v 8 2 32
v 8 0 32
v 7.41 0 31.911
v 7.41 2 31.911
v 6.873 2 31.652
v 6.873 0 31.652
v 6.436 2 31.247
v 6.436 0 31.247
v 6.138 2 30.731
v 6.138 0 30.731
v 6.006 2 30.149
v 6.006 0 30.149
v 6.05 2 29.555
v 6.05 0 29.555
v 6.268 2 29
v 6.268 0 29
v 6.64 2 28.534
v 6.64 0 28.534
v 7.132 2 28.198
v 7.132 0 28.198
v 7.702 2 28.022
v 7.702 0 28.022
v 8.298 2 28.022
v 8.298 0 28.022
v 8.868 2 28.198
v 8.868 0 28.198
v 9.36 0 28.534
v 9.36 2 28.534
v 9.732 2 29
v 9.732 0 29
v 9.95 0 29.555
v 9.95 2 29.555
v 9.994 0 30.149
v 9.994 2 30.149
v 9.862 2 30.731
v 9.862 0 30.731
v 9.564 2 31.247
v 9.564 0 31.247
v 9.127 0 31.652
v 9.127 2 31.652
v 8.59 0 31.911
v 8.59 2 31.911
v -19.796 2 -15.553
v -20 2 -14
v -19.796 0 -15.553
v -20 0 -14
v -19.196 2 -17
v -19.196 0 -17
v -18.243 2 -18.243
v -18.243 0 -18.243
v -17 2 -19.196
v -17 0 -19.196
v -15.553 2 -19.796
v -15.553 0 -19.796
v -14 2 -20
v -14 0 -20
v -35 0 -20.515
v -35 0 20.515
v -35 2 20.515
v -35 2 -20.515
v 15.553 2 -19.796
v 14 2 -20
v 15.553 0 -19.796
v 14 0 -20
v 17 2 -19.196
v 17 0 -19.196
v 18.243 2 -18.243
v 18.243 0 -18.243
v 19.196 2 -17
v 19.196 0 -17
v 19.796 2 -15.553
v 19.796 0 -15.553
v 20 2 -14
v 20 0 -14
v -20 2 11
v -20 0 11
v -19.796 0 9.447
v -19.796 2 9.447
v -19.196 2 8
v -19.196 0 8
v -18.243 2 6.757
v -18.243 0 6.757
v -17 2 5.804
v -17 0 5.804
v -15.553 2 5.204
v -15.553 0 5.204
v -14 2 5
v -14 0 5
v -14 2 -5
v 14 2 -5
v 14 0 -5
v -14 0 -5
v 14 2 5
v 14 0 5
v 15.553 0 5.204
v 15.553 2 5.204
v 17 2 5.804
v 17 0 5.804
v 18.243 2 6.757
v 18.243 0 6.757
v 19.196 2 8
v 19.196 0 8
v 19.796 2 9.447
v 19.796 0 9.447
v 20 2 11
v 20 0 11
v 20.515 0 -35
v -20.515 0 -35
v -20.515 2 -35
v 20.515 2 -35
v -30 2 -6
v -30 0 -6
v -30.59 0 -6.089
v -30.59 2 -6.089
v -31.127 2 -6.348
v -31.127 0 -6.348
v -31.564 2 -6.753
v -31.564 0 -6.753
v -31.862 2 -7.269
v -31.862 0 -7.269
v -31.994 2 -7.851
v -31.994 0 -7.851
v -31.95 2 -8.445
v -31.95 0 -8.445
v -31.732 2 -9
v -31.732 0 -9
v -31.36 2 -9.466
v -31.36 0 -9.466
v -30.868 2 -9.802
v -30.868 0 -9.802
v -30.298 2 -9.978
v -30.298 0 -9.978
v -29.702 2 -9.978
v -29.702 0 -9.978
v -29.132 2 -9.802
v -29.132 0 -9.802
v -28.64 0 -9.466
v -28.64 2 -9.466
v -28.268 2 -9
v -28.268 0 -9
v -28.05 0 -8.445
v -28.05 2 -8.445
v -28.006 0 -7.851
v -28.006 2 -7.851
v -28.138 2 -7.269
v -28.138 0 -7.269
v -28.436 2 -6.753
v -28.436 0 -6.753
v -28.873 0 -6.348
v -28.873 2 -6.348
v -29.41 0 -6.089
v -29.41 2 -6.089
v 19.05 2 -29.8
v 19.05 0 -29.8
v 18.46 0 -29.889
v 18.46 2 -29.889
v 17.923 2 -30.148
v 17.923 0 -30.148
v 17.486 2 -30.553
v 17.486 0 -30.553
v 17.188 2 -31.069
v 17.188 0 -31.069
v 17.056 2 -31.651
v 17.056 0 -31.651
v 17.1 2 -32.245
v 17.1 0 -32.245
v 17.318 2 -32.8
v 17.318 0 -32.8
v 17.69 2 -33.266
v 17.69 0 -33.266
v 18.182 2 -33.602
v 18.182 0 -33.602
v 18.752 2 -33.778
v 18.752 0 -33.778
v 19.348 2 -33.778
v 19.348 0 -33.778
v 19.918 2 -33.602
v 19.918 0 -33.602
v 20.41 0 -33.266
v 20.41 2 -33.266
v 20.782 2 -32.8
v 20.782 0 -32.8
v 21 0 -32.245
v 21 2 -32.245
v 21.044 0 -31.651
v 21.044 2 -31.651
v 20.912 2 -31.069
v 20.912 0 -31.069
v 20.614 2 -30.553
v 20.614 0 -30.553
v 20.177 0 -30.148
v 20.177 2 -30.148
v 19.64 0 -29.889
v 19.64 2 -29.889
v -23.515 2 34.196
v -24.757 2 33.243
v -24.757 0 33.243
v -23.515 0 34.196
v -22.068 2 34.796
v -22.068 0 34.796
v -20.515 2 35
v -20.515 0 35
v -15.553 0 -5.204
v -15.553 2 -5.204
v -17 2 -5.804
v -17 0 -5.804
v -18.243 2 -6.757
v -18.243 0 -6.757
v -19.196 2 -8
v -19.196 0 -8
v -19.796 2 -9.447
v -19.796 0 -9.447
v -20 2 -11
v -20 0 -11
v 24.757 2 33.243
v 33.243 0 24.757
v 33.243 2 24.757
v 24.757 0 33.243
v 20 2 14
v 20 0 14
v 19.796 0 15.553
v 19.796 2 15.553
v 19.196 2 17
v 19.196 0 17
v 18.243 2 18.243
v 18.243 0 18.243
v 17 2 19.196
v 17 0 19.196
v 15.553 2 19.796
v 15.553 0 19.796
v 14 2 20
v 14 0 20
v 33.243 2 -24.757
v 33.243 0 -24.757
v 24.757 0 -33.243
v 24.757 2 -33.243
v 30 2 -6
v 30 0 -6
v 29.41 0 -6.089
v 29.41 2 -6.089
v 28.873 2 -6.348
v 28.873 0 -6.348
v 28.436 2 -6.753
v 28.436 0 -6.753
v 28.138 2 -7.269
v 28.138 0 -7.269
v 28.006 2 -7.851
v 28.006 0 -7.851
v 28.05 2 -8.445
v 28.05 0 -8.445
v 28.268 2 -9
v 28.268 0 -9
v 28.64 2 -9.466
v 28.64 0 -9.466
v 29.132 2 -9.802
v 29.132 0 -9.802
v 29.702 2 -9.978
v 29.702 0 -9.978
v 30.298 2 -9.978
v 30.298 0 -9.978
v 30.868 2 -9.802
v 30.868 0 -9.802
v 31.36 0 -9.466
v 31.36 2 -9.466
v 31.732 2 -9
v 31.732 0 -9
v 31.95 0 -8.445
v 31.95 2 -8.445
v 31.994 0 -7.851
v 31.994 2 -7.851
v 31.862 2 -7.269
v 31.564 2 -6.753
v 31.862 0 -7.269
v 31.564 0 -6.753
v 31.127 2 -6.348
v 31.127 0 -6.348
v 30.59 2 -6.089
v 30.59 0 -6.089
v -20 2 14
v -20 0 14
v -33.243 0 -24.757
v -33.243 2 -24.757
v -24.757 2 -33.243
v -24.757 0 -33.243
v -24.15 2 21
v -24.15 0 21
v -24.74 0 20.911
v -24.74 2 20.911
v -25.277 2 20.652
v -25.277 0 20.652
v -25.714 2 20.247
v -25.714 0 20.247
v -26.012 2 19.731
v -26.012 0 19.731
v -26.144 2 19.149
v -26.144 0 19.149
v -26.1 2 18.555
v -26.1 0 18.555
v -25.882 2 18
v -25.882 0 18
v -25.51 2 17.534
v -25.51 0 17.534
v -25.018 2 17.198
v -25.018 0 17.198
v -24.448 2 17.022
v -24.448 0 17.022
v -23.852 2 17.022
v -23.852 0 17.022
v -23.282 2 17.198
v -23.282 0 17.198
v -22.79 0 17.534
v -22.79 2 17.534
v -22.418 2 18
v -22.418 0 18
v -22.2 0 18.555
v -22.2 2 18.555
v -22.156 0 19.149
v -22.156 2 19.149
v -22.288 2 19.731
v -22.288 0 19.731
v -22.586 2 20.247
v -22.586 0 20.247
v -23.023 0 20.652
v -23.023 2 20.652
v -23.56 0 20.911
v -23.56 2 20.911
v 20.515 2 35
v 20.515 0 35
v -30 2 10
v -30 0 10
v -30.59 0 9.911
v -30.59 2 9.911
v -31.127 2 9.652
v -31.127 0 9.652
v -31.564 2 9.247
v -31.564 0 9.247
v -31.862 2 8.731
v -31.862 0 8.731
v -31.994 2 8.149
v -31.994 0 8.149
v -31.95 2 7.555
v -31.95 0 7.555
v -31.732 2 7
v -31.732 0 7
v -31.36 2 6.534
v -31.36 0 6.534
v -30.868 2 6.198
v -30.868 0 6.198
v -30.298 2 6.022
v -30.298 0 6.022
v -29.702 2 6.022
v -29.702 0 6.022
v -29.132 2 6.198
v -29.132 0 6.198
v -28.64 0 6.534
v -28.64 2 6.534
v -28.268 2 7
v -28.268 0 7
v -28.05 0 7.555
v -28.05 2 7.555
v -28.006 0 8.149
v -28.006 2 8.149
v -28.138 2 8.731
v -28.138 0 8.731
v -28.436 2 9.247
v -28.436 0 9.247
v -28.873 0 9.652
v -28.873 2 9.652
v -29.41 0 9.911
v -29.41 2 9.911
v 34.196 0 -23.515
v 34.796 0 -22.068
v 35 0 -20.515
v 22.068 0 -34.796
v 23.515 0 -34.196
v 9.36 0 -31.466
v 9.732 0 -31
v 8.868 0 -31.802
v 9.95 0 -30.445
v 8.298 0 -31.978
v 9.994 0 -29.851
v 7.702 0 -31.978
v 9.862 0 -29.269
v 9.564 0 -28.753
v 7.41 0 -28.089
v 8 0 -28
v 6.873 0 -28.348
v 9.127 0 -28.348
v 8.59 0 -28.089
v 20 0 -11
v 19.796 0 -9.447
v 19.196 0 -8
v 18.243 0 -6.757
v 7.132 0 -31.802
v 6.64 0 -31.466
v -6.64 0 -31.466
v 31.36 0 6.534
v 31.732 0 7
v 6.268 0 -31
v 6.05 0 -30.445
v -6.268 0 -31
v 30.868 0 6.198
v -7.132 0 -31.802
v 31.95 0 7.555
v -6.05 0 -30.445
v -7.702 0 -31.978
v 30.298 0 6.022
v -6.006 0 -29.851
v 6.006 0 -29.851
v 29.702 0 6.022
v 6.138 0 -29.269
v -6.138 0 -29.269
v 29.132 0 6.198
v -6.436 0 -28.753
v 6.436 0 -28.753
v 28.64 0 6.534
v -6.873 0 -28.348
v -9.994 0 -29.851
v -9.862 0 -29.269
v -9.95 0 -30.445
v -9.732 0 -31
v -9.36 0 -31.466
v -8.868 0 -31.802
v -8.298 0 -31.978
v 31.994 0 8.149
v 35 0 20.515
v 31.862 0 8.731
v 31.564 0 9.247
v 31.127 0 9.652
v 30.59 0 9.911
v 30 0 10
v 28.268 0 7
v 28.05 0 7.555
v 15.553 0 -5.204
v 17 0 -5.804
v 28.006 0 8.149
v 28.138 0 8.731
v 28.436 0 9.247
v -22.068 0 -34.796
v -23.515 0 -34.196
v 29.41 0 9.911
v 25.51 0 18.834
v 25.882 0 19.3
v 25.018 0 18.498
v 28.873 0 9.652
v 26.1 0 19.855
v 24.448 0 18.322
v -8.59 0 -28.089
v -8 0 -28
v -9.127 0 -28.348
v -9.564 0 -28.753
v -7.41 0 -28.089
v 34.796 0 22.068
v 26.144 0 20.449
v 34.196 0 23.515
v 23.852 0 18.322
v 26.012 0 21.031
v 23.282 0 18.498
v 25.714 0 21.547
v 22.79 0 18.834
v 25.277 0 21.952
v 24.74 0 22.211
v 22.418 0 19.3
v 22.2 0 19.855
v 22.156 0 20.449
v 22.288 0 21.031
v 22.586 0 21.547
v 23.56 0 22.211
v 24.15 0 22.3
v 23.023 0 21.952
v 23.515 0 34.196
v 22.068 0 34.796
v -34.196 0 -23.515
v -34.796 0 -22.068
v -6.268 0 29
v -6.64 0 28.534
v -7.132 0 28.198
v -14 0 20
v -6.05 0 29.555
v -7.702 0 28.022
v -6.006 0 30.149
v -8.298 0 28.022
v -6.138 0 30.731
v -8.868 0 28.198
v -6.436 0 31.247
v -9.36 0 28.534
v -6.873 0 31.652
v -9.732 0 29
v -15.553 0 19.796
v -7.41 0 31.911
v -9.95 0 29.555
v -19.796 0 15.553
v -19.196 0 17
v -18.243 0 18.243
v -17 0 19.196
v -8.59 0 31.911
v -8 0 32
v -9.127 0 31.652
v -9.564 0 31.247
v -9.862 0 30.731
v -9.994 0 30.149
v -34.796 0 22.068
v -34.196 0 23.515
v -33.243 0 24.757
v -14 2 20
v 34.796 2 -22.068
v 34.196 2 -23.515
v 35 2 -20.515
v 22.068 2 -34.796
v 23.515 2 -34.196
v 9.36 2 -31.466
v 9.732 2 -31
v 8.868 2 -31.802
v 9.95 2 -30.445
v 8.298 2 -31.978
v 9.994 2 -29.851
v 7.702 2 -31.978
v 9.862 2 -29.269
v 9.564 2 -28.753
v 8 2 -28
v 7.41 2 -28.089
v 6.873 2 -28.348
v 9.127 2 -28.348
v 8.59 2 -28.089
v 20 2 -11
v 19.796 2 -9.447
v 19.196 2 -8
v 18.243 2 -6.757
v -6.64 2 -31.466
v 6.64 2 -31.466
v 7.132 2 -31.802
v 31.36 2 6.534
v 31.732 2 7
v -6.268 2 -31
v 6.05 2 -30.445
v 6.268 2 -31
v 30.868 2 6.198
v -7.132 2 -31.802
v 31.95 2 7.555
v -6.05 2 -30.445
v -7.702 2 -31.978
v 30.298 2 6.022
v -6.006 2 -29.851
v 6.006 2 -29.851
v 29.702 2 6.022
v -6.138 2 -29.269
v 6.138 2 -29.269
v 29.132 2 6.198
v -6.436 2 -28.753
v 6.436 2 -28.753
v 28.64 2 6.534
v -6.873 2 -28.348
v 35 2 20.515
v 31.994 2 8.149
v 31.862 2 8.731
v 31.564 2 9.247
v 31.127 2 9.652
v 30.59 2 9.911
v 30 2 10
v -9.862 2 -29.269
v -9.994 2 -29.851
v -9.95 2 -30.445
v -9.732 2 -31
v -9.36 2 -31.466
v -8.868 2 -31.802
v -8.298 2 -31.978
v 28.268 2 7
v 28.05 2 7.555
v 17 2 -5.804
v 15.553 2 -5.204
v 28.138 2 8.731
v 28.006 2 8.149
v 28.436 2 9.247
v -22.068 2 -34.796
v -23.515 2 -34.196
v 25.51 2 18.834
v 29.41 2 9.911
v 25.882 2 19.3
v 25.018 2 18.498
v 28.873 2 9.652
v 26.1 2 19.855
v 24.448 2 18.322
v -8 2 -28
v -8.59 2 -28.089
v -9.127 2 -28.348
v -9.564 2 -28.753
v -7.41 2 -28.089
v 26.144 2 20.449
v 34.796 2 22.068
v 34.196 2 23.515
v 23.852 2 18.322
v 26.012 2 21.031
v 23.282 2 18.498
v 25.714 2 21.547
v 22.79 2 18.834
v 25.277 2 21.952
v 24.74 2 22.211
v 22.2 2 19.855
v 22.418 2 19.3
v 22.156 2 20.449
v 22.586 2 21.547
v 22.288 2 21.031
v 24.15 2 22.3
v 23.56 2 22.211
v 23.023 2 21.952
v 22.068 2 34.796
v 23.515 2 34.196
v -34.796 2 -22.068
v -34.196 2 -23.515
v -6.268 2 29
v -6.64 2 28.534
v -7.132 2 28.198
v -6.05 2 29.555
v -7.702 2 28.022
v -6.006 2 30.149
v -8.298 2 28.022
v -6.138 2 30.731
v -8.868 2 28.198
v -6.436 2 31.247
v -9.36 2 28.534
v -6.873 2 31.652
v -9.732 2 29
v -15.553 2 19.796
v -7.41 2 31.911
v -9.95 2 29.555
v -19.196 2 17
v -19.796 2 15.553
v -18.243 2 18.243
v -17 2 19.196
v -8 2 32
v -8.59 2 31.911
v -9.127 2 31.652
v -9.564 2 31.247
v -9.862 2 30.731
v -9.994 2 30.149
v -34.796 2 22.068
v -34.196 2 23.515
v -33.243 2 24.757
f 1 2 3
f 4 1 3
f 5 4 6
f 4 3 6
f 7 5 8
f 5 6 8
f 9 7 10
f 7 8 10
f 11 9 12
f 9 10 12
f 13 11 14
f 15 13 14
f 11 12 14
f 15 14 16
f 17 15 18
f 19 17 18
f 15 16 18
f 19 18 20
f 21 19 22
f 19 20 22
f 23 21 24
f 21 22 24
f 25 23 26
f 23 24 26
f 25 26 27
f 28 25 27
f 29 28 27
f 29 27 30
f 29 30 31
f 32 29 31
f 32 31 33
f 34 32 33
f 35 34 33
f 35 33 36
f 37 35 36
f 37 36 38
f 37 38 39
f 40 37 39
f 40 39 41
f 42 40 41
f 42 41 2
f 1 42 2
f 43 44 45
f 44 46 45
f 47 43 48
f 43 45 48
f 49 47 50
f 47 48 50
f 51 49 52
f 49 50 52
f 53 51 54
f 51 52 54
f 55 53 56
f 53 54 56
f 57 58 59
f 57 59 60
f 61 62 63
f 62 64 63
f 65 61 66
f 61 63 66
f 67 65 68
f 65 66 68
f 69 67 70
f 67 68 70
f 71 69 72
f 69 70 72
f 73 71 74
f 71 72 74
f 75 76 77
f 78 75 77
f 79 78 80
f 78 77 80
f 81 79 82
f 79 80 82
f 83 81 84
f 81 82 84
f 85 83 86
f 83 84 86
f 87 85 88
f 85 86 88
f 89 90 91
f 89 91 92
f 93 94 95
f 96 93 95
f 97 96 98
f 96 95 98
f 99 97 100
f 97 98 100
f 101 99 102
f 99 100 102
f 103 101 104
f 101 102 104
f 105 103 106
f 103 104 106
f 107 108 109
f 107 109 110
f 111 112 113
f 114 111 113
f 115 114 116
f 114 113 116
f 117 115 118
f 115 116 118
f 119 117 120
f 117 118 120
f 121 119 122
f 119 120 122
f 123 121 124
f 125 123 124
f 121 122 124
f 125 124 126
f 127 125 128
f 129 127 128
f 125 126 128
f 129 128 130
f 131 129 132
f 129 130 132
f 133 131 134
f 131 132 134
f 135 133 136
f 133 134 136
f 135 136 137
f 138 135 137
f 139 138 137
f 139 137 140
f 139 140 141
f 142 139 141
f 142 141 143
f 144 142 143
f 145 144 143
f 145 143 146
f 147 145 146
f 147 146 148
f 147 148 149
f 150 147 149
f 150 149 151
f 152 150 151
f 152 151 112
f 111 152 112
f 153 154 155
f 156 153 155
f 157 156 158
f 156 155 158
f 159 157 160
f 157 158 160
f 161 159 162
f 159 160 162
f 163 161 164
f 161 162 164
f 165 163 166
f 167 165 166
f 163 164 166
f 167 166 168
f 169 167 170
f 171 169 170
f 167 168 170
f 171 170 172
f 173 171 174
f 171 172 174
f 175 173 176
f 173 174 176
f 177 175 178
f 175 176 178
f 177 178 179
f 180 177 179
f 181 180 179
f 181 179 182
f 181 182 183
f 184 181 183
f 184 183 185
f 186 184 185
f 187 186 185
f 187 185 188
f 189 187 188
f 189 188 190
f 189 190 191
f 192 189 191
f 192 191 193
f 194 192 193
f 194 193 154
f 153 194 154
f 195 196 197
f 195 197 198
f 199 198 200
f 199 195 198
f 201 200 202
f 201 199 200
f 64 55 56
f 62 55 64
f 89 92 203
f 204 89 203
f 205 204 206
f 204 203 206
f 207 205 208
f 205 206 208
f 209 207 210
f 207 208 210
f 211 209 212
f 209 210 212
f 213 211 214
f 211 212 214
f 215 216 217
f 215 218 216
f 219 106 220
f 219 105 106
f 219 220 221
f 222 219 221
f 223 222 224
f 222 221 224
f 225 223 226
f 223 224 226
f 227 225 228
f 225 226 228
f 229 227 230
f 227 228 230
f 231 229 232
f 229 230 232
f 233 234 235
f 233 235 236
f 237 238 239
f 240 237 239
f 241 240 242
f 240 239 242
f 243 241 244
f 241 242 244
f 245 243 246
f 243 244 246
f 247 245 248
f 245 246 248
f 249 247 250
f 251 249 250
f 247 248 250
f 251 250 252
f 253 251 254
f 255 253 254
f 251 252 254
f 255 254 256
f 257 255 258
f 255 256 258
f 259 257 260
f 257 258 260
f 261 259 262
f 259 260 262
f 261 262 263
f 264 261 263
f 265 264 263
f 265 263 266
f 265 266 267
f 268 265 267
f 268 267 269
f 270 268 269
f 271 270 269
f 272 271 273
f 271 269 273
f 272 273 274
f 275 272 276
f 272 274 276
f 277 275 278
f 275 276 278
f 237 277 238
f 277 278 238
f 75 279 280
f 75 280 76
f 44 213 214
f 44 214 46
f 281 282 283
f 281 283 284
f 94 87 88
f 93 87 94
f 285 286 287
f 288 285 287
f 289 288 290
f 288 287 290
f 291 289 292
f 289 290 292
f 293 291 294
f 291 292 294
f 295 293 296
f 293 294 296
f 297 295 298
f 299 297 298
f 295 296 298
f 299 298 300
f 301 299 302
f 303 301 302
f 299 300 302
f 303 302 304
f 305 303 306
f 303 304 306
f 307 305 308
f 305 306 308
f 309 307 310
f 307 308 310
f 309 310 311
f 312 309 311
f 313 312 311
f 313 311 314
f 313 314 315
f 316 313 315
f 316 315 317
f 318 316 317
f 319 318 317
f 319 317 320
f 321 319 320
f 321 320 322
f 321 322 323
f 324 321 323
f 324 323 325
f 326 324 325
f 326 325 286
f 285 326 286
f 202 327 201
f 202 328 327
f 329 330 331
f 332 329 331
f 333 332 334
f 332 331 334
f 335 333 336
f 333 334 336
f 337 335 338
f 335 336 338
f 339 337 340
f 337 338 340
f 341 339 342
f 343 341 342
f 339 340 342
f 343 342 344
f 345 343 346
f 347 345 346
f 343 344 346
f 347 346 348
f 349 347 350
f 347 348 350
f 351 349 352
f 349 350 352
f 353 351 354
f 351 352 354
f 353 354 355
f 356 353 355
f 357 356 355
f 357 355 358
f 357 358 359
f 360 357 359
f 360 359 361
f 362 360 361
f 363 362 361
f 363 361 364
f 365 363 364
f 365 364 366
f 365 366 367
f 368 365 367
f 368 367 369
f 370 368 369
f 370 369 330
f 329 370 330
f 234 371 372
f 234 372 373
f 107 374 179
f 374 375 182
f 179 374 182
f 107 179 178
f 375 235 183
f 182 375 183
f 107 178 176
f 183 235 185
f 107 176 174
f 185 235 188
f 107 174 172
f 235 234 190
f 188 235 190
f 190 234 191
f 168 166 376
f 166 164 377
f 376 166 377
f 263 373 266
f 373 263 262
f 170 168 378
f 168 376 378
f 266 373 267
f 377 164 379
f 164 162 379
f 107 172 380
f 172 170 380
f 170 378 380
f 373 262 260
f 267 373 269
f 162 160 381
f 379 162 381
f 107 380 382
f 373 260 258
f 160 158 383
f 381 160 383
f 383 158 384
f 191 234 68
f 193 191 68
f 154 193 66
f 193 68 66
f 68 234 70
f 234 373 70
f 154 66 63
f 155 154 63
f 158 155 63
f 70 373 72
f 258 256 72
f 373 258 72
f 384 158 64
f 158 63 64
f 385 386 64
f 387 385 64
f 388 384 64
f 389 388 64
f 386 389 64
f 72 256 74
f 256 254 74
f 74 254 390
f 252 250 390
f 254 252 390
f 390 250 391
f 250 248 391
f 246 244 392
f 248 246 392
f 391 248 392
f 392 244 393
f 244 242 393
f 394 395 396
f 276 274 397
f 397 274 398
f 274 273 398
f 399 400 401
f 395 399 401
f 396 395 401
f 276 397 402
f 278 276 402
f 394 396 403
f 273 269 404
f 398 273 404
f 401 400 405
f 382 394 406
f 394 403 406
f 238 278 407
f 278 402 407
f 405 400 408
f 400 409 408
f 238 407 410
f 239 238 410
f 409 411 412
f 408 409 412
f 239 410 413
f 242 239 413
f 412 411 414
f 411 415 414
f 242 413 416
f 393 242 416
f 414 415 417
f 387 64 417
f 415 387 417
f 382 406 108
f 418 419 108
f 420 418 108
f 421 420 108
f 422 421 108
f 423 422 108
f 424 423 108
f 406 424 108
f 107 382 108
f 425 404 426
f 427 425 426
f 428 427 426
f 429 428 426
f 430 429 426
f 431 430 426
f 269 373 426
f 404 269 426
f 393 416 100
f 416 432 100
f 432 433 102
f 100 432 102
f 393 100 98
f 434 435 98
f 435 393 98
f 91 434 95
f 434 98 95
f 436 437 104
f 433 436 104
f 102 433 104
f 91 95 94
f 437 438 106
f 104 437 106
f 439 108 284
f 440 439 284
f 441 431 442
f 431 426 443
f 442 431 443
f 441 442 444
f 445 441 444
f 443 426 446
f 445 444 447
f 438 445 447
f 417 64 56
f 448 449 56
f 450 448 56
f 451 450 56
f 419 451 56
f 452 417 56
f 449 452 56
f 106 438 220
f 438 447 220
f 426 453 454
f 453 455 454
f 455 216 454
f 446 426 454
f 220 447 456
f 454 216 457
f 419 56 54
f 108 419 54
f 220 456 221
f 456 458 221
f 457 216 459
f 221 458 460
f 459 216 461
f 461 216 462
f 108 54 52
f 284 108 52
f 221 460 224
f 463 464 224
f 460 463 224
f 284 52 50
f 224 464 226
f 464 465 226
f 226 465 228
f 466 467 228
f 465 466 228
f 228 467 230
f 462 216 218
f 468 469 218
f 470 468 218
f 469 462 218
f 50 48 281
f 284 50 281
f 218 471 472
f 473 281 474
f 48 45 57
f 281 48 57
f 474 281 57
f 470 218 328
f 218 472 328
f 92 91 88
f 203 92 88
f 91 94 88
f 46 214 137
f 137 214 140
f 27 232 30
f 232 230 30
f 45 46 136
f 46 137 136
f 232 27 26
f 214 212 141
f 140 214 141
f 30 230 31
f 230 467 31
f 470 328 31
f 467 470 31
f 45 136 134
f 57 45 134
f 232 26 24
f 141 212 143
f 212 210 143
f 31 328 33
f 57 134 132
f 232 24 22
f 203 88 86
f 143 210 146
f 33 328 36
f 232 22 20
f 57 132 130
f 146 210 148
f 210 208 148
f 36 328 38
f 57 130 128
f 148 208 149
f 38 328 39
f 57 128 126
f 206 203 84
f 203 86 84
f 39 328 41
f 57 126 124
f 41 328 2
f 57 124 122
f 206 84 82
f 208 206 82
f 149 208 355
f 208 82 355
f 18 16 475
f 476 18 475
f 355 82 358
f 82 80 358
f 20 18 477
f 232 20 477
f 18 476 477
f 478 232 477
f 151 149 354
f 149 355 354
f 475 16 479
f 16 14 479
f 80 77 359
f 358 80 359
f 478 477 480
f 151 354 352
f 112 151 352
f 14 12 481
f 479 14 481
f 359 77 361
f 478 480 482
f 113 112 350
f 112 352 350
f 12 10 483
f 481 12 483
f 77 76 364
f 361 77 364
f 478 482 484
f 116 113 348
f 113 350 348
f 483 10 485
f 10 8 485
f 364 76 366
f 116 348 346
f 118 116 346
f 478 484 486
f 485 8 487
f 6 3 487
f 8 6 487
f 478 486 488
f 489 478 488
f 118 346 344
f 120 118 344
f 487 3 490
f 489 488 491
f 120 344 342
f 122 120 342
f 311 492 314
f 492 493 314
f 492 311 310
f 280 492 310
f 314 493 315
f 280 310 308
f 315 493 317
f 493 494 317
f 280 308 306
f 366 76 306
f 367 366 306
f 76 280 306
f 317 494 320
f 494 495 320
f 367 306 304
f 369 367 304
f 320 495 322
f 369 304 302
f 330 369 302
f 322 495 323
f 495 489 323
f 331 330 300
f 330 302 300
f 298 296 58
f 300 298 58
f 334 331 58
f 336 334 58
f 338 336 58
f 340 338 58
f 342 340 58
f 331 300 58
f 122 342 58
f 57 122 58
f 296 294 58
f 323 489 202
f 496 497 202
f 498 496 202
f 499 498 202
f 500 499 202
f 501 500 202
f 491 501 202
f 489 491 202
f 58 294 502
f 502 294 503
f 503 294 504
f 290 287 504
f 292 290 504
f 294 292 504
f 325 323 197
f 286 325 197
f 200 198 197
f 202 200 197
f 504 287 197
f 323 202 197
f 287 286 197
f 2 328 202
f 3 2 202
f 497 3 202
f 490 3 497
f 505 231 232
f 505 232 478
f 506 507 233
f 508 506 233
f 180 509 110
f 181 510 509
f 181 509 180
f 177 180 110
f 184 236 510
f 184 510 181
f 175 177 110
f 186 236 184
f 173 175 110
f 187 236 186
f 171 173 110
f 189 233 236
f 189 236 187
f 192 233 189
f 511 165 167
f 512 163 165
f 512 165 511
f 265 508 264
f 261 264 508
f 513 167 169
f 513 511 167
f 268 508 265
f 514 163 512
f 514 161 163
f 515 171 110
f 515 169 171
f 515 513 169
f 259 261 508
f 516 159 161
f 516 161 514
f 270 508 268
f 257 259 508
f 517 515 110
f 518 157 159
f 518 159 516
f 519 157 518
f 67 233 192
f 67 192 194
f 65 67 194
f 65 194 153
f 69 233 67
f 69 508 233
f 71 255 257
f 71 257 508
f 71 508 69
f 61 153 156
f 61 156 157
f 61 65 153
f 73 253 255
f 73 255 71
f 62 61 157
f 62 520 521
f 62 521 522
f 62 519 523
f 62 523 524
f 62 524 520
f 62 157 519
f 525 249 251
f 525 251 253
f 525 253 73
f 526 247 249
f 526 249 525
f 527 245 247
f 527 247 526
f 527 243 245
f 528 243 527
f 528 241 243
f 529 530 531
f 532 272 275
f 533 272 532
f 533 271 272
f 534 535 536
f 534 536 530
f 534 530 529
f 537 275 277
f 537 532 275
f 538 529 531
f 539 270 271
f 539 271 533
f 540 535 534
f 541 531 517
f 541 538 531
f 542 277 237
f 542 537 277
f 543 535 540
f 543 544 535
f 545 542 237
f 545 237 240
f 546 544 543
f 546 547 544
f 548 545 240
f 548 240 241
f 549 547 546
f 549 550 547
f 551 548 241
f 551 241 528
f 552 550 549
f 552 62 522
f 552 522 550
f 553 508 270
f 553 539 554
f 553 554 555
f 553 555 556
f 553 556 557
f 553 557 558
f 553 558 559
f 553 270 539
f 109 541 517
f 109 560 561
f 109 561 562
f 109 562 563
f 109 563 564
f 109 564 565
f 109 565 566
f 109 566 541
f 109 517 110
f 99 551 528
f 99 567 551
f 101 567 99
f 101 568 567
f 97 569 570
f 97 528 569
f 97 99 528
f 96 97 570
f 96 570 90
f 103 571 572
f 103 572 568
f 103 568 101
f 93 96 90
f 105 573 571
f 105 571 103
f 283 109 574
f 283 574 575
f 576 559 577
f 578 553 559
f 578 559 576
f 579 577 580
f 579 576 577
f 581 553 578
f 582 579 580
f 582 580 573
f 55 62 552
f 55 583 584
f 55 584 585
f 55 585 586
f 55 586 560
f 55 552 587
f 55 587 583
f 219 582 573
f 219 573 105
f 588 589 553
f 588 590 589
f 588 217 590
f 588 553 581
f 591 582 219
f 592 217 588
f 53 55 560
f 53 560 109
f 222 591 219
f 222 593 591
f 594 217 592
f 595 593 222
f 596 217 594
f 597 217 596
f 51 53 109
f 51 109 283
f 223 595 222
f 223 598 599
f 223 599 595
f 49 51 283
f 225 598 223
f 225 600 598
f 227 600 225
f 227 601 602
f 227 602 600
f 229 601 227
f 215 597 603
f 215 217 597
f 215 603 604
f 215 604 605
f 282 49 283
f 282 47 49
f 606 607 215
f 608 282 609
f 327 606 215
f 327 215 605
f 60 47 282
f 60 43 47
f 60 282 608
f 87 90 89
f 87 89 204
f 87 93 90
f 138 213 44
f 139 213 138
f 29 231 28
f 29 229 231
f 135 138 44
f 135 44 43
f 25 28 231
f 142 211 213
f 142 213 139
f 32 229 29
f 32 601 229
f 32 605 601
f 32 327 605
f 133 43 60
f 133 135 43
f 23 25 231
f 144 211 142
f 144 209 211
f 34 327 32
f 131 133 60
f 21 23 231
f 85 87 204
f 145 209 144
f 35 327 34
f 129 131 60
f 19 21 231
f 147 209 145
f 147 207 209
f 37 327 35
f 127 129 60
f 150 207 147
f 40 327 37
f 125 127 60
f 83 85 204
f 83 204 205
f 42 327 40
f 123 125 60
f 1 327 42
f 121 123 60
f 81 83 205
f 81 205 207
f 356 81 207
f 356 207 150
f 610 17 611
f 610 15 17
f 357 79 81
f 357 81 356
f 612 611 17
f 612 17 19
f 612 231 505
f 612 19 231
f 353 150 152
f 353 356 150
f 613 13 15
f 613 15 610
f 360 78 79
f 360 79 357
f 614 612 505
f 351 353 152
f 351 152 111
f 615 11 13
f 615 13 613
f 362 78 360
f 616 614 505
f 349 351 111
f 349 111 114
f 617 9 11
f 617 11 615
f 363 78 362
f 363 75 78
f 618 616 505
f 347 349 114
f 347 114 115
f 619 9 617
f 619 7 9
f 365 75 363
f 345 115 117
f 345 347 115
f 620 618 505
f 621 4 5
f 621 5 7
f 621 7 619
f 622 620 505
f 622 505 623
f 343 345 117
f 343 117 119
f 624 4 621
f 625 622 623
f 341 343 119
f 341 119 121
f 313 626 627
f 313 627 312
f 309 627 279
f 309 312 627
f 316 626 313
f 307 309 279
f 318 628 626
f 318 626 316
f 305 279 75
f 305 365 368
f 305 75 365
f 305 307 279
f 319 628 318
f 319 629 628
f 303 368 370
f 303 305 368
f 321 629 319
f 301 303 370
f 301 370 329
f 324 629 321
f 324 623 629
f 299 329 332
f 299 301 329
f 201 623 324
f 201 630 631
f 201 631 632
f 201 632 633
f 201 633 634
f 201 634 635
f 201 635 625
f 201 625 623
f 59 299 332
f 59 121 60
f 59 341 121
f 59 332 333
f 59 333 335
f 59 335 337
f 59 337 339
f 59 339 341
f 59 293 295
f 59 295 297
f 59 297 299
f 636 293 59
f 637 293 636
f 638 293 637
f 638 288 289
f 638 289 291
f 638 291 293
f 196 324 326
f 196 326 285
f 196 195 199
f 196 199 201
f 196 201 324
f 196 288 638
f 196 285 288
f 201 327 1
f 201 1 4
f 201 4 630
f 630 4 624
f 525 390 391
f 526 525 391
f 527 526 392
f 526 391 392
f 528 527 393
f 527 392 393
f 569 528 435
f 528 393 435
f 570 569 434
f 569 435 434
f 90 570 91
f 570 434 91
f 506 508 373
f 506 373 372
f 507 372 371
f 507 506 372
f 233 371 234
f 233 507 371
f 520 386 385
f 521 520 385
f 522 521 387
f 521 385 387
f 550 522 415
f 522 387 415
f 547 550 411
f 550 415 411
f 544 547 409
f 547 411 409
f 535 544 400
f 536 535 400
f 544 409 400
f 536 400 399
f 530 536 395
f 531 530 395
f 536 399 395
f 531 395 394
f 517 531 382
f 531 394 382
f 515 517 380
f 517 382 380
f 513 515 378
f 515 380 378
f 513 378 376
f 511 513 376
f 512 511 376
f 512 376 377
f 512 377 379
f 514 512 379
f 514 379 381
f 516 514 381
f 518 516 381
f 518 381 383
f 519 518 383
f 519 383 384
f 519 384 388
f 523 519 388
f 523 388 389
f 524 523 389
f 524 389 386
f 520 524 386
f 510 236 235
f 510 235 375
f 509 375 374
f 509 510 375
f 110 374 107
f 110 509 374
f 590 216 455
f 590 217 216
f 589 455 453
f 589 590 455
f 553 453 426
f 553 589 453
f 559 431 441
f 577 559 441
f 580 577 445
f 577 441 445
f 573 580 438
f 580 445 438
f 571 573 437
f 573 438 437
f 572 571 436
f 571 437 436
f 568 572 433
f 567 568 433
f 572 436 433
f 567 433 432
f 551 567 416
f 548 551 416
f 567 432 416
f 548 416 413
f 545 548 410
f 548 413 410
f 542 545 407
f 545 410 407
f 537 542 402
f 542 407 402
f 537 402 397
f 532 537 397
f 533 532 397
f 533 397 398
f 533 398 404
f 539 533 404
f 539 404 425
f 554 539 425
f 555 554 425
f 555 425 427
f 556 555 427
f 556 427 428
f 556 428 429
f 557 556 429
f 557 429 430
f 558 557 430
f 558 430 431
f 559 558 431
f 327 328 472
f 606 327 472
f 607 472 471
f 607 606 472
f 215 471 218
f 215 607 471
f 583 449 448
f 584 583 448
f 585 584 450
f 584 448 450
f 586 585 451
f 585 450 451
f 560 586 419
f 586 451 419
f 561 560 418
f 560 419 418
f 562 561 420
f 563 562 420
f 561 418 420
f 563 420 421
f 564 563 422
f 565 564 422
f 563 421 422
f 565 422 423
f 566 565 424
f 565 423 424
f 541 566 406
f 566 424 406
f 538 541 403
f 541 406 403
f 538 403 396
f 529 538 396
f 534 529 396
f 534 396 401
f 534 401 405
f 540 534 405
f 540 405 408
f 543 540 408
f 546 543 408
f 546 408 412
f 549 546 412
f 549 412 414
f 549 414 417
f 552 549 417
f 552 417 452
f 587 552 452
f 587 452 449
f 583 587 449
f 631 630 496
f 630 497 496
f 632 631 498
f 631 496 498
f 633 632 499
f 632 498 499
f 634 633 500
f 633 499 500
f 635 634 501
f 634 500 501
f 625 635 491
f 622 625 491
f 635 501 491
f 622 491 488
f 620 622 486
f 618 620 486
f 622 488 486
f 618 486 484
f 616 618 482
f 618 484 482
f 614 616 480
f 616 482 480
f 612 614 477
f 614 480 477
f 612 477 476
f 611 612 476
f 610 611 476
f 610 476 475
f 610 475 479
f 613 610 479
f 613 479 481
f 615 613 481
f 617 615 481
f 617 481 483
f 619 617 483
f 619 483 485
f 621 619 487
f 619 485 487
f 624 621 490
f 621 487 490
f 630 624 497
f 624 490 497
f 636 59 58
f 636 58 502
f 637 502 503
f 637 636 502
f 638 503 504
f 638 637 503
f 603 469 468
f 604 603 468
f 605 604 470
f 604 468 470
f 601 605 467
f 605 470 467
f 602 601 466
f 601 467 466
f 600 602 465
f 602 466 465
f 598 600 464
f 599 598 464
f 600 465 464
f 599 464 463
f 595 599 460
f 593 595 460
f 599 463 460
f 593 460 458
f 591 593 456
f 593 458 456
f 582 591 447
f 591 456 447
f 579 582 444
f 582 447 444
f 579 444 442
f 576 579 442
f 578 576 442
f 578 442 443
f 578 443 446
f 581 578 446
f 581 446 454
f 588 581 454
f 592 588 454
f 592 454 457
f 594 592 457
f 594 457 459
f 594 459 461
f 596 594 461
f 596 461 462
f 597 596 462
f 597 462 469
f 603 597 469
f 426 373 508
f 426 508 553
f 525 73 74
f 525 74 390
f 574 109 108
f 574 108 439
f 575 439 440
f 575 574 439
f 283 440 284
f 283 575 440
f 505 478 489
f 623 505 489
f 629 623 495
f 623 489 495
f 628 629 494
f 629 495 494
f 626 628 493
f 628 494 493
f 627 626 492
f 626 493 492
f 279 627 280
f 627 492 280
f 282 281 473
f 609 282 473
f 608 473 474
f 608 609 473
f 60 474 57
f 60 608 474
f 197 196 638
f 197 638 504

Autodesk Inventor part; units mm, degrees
ref_plane "YZ Plane" through (0, 0, 0) normal (1, 0, 0) x (0, 1, 0)
ref_plane "XZ Plane" through (0, 0, 0) normal (0, 1, 0) x (-1, 0, 0)
ref_plane "XY Plane" through (0, 0, 0) normal (0, 0, 1) x (1, 0, 0)
sketch "Sketch23" plane through (0, 0, 0) normal (0, 1, 0) x (-1, 0, 0)
  line L0 (0, -49) -> (0, 49) projected
  line L1 (49, 0) -> (-49, 0) projected
  line L2 (35, -35) -> (-35, -35)
  line L3 (-35, -35) -> (-35, 35)
  line L4 (-35, 35) -> (35, 35)
  line L5 (35, 35) -> (35, -35)
  point P0 (0, 0)
  dimension "d310" = 70
  dimension "d311" = 70
extrude "Extrusion14" add sketch "Sketch23" along normal blind 2
sketch "Sketch37" plane through (0, 2, 0) normal (0, 1, 0) x (1, 0, 0)
  line L0 (-35, -35) -> (35, -35) projected
  line L1 (35, -35) -> (35, 35) projected
  line L2 (35, 35) -> (-35, 35) projected
  line L3 (-35, 35) -> (-35, -35) projected
  line L4 (-49, 0) -> (49, 0) projected
  line L5 (0, 49) -> (0, -49) projected
  line L6 (-26.65, 34.3) -> (26.65, 34.3) construction
  line L7 (26.65, 34.3) -> (26.65, -34.3) construction
  line L8 (26.65, -34.3) -> (-26.65, -34.3) construction
  line L9 (-26.65, -34.3) -> (-26.65, 34.3) construction
  point P0 (-24.15, -19)
  point P1 (24.15, -20.3)
  point P2 (19.05, 31.8)
  dimension "d327" = 68.6
  dimension "d328" = 53.3
  dimension "d329" = 15.3
  dimension "d330" = 14
  dimension "d331" = 2.5
  dimension "d332" = 2.5
  dimension "d333" = 2.5
  dimension "d334" = 7.6
hole "Hole18" at (-24.15, 2, 19) at (24.15, 2, 20.3) at (19.05, 2, -31.8) direction (0, -1, 0) diameter 4 end through all
sketch "Sketch40" plane through (0, 2, 0) normal (0, 1, 0) x (1, 0, 0)
  circle A0 centre (19.05, 31.8) radius 2 projected
  circle A1 centre (-24.15, -19) radius 2 projected
  circle A2 centre (24.15, -20.3) radius 2 projected
  line L0 (35, 35) -> (-35, 35) projected
  line L1 (-35, 35) -> (-35, -35) projected
  line L2 (-35, -35) -> (35, -35) projected
  line L3 (35, -35) -> (35, 35) projected
  line L4 (-49, 0) -> (49, 0) projected
  line L5 (0, 49) -> (0, -49) projected
  point P0 (0, 0)
  point P1 (8, 30)
  point P2 (30, 8)
  point P3 (30, -8)
  point P4 (-30, 8)
  point P5 (-30, -8)
  point P6 (-8, -30)
  point P7 (8, -30)
  point P8 (-8, 30)
  dimension "d445" = 8
  dimension "d446" = 5
  dimension "d447" = 8
  dimension "d448" = 5
  dimension "d449" = 8
  dimension "d450" = 5
  dimension "d458" = 8
  dimension "d459" = 8
  dimension "d460" = 5
  dimension "d461" = 5
  dimension "d462" = 5
  dimension "d463" = 8
  dimension "d464" = 8
  dimension "d465" = 5
  dimension "d478" = 8
  dimension "d479" = 5
sketch "Sketch41" plane through (0, 2, 0) normal (0, 1, 0) x (1, 0, 0)
  circle A0 centre (19.05, 31.8) radius 2 projected
  circle A1 centre (-24.15, -19) radius 2 projected
  circle A2 centre (24.15, -20.3) radius 2 projected
  line L0 (35, 35) -> (-35, 35) projected
  line L1 (-35, 35) -> (-35, -35) projected
  line L2 (-35, -35) -> (35, -35) projected
  line L3 (35, -35) -> (35, 35) projected
  line L4 (-49, 0) -> (49, 0) projected
  line L5 (0, 49) -> (0, -49) projected
  line L6 (-20, 20) -> (20, 20)
  line L7 (20, 20) -> (20, 5)
  line L8 (20, 5) -> (-20, 5)
  line L9 (-20, 5) -> (-20, 20)
  line L10 (-20, -5) -> (20, -5)
  line L11 (20, -5) -> (20, -20)
  line L12 (20, -20) -> (-20, -20)
  line L13 (-20, -20) -> (-20, -5)
  dimension "d467" = 10
  dimension "d468" = 40
  dimension "d480" = 15
  dimension "d481" = 15
hole "Hole21" at (8, 2, -30) at (30, 2, -8) at (30, 2, 8) at (-30, 2, -8) at (-30, 2, 8) at (-8, 2, 30) at (8, 2, 30) at (-8, 2, -30) direction (0, -1, 0) diameter 4 end through all
extrude "Extrusion25" cut sketch "Sketch41" against normal up to next contours L6 L7 L8 L5 | L5 L8 L9 L6 | L10 L11 L12 L5 | L5 L12 L13 L10
fillet "Fillet26" radius 6 8 edges at (20, 1, -20) (-20, 1, -20) (-20, 1, -5) (20, 1, -5) (20, 1, 5) (20, 1, 20) (-20, 1, 20) (-20, 1, 5)
chamfer "Chamfer10" distance 12 angle 45 4 edges at (-35, 1, 35) (35, 1, 35) (35, 1, -35) (-35, 1, -35)
fillet "Fillet27" radius 6 8 edges at (-23, 1, 35) (-35, 1, 23) (-35, 1, -23) (-23, 1, -35) (23, 1, -35) (35, 1, -23) (23, 1, 35) (35, 1, 23)
properties part number "body_plate"
